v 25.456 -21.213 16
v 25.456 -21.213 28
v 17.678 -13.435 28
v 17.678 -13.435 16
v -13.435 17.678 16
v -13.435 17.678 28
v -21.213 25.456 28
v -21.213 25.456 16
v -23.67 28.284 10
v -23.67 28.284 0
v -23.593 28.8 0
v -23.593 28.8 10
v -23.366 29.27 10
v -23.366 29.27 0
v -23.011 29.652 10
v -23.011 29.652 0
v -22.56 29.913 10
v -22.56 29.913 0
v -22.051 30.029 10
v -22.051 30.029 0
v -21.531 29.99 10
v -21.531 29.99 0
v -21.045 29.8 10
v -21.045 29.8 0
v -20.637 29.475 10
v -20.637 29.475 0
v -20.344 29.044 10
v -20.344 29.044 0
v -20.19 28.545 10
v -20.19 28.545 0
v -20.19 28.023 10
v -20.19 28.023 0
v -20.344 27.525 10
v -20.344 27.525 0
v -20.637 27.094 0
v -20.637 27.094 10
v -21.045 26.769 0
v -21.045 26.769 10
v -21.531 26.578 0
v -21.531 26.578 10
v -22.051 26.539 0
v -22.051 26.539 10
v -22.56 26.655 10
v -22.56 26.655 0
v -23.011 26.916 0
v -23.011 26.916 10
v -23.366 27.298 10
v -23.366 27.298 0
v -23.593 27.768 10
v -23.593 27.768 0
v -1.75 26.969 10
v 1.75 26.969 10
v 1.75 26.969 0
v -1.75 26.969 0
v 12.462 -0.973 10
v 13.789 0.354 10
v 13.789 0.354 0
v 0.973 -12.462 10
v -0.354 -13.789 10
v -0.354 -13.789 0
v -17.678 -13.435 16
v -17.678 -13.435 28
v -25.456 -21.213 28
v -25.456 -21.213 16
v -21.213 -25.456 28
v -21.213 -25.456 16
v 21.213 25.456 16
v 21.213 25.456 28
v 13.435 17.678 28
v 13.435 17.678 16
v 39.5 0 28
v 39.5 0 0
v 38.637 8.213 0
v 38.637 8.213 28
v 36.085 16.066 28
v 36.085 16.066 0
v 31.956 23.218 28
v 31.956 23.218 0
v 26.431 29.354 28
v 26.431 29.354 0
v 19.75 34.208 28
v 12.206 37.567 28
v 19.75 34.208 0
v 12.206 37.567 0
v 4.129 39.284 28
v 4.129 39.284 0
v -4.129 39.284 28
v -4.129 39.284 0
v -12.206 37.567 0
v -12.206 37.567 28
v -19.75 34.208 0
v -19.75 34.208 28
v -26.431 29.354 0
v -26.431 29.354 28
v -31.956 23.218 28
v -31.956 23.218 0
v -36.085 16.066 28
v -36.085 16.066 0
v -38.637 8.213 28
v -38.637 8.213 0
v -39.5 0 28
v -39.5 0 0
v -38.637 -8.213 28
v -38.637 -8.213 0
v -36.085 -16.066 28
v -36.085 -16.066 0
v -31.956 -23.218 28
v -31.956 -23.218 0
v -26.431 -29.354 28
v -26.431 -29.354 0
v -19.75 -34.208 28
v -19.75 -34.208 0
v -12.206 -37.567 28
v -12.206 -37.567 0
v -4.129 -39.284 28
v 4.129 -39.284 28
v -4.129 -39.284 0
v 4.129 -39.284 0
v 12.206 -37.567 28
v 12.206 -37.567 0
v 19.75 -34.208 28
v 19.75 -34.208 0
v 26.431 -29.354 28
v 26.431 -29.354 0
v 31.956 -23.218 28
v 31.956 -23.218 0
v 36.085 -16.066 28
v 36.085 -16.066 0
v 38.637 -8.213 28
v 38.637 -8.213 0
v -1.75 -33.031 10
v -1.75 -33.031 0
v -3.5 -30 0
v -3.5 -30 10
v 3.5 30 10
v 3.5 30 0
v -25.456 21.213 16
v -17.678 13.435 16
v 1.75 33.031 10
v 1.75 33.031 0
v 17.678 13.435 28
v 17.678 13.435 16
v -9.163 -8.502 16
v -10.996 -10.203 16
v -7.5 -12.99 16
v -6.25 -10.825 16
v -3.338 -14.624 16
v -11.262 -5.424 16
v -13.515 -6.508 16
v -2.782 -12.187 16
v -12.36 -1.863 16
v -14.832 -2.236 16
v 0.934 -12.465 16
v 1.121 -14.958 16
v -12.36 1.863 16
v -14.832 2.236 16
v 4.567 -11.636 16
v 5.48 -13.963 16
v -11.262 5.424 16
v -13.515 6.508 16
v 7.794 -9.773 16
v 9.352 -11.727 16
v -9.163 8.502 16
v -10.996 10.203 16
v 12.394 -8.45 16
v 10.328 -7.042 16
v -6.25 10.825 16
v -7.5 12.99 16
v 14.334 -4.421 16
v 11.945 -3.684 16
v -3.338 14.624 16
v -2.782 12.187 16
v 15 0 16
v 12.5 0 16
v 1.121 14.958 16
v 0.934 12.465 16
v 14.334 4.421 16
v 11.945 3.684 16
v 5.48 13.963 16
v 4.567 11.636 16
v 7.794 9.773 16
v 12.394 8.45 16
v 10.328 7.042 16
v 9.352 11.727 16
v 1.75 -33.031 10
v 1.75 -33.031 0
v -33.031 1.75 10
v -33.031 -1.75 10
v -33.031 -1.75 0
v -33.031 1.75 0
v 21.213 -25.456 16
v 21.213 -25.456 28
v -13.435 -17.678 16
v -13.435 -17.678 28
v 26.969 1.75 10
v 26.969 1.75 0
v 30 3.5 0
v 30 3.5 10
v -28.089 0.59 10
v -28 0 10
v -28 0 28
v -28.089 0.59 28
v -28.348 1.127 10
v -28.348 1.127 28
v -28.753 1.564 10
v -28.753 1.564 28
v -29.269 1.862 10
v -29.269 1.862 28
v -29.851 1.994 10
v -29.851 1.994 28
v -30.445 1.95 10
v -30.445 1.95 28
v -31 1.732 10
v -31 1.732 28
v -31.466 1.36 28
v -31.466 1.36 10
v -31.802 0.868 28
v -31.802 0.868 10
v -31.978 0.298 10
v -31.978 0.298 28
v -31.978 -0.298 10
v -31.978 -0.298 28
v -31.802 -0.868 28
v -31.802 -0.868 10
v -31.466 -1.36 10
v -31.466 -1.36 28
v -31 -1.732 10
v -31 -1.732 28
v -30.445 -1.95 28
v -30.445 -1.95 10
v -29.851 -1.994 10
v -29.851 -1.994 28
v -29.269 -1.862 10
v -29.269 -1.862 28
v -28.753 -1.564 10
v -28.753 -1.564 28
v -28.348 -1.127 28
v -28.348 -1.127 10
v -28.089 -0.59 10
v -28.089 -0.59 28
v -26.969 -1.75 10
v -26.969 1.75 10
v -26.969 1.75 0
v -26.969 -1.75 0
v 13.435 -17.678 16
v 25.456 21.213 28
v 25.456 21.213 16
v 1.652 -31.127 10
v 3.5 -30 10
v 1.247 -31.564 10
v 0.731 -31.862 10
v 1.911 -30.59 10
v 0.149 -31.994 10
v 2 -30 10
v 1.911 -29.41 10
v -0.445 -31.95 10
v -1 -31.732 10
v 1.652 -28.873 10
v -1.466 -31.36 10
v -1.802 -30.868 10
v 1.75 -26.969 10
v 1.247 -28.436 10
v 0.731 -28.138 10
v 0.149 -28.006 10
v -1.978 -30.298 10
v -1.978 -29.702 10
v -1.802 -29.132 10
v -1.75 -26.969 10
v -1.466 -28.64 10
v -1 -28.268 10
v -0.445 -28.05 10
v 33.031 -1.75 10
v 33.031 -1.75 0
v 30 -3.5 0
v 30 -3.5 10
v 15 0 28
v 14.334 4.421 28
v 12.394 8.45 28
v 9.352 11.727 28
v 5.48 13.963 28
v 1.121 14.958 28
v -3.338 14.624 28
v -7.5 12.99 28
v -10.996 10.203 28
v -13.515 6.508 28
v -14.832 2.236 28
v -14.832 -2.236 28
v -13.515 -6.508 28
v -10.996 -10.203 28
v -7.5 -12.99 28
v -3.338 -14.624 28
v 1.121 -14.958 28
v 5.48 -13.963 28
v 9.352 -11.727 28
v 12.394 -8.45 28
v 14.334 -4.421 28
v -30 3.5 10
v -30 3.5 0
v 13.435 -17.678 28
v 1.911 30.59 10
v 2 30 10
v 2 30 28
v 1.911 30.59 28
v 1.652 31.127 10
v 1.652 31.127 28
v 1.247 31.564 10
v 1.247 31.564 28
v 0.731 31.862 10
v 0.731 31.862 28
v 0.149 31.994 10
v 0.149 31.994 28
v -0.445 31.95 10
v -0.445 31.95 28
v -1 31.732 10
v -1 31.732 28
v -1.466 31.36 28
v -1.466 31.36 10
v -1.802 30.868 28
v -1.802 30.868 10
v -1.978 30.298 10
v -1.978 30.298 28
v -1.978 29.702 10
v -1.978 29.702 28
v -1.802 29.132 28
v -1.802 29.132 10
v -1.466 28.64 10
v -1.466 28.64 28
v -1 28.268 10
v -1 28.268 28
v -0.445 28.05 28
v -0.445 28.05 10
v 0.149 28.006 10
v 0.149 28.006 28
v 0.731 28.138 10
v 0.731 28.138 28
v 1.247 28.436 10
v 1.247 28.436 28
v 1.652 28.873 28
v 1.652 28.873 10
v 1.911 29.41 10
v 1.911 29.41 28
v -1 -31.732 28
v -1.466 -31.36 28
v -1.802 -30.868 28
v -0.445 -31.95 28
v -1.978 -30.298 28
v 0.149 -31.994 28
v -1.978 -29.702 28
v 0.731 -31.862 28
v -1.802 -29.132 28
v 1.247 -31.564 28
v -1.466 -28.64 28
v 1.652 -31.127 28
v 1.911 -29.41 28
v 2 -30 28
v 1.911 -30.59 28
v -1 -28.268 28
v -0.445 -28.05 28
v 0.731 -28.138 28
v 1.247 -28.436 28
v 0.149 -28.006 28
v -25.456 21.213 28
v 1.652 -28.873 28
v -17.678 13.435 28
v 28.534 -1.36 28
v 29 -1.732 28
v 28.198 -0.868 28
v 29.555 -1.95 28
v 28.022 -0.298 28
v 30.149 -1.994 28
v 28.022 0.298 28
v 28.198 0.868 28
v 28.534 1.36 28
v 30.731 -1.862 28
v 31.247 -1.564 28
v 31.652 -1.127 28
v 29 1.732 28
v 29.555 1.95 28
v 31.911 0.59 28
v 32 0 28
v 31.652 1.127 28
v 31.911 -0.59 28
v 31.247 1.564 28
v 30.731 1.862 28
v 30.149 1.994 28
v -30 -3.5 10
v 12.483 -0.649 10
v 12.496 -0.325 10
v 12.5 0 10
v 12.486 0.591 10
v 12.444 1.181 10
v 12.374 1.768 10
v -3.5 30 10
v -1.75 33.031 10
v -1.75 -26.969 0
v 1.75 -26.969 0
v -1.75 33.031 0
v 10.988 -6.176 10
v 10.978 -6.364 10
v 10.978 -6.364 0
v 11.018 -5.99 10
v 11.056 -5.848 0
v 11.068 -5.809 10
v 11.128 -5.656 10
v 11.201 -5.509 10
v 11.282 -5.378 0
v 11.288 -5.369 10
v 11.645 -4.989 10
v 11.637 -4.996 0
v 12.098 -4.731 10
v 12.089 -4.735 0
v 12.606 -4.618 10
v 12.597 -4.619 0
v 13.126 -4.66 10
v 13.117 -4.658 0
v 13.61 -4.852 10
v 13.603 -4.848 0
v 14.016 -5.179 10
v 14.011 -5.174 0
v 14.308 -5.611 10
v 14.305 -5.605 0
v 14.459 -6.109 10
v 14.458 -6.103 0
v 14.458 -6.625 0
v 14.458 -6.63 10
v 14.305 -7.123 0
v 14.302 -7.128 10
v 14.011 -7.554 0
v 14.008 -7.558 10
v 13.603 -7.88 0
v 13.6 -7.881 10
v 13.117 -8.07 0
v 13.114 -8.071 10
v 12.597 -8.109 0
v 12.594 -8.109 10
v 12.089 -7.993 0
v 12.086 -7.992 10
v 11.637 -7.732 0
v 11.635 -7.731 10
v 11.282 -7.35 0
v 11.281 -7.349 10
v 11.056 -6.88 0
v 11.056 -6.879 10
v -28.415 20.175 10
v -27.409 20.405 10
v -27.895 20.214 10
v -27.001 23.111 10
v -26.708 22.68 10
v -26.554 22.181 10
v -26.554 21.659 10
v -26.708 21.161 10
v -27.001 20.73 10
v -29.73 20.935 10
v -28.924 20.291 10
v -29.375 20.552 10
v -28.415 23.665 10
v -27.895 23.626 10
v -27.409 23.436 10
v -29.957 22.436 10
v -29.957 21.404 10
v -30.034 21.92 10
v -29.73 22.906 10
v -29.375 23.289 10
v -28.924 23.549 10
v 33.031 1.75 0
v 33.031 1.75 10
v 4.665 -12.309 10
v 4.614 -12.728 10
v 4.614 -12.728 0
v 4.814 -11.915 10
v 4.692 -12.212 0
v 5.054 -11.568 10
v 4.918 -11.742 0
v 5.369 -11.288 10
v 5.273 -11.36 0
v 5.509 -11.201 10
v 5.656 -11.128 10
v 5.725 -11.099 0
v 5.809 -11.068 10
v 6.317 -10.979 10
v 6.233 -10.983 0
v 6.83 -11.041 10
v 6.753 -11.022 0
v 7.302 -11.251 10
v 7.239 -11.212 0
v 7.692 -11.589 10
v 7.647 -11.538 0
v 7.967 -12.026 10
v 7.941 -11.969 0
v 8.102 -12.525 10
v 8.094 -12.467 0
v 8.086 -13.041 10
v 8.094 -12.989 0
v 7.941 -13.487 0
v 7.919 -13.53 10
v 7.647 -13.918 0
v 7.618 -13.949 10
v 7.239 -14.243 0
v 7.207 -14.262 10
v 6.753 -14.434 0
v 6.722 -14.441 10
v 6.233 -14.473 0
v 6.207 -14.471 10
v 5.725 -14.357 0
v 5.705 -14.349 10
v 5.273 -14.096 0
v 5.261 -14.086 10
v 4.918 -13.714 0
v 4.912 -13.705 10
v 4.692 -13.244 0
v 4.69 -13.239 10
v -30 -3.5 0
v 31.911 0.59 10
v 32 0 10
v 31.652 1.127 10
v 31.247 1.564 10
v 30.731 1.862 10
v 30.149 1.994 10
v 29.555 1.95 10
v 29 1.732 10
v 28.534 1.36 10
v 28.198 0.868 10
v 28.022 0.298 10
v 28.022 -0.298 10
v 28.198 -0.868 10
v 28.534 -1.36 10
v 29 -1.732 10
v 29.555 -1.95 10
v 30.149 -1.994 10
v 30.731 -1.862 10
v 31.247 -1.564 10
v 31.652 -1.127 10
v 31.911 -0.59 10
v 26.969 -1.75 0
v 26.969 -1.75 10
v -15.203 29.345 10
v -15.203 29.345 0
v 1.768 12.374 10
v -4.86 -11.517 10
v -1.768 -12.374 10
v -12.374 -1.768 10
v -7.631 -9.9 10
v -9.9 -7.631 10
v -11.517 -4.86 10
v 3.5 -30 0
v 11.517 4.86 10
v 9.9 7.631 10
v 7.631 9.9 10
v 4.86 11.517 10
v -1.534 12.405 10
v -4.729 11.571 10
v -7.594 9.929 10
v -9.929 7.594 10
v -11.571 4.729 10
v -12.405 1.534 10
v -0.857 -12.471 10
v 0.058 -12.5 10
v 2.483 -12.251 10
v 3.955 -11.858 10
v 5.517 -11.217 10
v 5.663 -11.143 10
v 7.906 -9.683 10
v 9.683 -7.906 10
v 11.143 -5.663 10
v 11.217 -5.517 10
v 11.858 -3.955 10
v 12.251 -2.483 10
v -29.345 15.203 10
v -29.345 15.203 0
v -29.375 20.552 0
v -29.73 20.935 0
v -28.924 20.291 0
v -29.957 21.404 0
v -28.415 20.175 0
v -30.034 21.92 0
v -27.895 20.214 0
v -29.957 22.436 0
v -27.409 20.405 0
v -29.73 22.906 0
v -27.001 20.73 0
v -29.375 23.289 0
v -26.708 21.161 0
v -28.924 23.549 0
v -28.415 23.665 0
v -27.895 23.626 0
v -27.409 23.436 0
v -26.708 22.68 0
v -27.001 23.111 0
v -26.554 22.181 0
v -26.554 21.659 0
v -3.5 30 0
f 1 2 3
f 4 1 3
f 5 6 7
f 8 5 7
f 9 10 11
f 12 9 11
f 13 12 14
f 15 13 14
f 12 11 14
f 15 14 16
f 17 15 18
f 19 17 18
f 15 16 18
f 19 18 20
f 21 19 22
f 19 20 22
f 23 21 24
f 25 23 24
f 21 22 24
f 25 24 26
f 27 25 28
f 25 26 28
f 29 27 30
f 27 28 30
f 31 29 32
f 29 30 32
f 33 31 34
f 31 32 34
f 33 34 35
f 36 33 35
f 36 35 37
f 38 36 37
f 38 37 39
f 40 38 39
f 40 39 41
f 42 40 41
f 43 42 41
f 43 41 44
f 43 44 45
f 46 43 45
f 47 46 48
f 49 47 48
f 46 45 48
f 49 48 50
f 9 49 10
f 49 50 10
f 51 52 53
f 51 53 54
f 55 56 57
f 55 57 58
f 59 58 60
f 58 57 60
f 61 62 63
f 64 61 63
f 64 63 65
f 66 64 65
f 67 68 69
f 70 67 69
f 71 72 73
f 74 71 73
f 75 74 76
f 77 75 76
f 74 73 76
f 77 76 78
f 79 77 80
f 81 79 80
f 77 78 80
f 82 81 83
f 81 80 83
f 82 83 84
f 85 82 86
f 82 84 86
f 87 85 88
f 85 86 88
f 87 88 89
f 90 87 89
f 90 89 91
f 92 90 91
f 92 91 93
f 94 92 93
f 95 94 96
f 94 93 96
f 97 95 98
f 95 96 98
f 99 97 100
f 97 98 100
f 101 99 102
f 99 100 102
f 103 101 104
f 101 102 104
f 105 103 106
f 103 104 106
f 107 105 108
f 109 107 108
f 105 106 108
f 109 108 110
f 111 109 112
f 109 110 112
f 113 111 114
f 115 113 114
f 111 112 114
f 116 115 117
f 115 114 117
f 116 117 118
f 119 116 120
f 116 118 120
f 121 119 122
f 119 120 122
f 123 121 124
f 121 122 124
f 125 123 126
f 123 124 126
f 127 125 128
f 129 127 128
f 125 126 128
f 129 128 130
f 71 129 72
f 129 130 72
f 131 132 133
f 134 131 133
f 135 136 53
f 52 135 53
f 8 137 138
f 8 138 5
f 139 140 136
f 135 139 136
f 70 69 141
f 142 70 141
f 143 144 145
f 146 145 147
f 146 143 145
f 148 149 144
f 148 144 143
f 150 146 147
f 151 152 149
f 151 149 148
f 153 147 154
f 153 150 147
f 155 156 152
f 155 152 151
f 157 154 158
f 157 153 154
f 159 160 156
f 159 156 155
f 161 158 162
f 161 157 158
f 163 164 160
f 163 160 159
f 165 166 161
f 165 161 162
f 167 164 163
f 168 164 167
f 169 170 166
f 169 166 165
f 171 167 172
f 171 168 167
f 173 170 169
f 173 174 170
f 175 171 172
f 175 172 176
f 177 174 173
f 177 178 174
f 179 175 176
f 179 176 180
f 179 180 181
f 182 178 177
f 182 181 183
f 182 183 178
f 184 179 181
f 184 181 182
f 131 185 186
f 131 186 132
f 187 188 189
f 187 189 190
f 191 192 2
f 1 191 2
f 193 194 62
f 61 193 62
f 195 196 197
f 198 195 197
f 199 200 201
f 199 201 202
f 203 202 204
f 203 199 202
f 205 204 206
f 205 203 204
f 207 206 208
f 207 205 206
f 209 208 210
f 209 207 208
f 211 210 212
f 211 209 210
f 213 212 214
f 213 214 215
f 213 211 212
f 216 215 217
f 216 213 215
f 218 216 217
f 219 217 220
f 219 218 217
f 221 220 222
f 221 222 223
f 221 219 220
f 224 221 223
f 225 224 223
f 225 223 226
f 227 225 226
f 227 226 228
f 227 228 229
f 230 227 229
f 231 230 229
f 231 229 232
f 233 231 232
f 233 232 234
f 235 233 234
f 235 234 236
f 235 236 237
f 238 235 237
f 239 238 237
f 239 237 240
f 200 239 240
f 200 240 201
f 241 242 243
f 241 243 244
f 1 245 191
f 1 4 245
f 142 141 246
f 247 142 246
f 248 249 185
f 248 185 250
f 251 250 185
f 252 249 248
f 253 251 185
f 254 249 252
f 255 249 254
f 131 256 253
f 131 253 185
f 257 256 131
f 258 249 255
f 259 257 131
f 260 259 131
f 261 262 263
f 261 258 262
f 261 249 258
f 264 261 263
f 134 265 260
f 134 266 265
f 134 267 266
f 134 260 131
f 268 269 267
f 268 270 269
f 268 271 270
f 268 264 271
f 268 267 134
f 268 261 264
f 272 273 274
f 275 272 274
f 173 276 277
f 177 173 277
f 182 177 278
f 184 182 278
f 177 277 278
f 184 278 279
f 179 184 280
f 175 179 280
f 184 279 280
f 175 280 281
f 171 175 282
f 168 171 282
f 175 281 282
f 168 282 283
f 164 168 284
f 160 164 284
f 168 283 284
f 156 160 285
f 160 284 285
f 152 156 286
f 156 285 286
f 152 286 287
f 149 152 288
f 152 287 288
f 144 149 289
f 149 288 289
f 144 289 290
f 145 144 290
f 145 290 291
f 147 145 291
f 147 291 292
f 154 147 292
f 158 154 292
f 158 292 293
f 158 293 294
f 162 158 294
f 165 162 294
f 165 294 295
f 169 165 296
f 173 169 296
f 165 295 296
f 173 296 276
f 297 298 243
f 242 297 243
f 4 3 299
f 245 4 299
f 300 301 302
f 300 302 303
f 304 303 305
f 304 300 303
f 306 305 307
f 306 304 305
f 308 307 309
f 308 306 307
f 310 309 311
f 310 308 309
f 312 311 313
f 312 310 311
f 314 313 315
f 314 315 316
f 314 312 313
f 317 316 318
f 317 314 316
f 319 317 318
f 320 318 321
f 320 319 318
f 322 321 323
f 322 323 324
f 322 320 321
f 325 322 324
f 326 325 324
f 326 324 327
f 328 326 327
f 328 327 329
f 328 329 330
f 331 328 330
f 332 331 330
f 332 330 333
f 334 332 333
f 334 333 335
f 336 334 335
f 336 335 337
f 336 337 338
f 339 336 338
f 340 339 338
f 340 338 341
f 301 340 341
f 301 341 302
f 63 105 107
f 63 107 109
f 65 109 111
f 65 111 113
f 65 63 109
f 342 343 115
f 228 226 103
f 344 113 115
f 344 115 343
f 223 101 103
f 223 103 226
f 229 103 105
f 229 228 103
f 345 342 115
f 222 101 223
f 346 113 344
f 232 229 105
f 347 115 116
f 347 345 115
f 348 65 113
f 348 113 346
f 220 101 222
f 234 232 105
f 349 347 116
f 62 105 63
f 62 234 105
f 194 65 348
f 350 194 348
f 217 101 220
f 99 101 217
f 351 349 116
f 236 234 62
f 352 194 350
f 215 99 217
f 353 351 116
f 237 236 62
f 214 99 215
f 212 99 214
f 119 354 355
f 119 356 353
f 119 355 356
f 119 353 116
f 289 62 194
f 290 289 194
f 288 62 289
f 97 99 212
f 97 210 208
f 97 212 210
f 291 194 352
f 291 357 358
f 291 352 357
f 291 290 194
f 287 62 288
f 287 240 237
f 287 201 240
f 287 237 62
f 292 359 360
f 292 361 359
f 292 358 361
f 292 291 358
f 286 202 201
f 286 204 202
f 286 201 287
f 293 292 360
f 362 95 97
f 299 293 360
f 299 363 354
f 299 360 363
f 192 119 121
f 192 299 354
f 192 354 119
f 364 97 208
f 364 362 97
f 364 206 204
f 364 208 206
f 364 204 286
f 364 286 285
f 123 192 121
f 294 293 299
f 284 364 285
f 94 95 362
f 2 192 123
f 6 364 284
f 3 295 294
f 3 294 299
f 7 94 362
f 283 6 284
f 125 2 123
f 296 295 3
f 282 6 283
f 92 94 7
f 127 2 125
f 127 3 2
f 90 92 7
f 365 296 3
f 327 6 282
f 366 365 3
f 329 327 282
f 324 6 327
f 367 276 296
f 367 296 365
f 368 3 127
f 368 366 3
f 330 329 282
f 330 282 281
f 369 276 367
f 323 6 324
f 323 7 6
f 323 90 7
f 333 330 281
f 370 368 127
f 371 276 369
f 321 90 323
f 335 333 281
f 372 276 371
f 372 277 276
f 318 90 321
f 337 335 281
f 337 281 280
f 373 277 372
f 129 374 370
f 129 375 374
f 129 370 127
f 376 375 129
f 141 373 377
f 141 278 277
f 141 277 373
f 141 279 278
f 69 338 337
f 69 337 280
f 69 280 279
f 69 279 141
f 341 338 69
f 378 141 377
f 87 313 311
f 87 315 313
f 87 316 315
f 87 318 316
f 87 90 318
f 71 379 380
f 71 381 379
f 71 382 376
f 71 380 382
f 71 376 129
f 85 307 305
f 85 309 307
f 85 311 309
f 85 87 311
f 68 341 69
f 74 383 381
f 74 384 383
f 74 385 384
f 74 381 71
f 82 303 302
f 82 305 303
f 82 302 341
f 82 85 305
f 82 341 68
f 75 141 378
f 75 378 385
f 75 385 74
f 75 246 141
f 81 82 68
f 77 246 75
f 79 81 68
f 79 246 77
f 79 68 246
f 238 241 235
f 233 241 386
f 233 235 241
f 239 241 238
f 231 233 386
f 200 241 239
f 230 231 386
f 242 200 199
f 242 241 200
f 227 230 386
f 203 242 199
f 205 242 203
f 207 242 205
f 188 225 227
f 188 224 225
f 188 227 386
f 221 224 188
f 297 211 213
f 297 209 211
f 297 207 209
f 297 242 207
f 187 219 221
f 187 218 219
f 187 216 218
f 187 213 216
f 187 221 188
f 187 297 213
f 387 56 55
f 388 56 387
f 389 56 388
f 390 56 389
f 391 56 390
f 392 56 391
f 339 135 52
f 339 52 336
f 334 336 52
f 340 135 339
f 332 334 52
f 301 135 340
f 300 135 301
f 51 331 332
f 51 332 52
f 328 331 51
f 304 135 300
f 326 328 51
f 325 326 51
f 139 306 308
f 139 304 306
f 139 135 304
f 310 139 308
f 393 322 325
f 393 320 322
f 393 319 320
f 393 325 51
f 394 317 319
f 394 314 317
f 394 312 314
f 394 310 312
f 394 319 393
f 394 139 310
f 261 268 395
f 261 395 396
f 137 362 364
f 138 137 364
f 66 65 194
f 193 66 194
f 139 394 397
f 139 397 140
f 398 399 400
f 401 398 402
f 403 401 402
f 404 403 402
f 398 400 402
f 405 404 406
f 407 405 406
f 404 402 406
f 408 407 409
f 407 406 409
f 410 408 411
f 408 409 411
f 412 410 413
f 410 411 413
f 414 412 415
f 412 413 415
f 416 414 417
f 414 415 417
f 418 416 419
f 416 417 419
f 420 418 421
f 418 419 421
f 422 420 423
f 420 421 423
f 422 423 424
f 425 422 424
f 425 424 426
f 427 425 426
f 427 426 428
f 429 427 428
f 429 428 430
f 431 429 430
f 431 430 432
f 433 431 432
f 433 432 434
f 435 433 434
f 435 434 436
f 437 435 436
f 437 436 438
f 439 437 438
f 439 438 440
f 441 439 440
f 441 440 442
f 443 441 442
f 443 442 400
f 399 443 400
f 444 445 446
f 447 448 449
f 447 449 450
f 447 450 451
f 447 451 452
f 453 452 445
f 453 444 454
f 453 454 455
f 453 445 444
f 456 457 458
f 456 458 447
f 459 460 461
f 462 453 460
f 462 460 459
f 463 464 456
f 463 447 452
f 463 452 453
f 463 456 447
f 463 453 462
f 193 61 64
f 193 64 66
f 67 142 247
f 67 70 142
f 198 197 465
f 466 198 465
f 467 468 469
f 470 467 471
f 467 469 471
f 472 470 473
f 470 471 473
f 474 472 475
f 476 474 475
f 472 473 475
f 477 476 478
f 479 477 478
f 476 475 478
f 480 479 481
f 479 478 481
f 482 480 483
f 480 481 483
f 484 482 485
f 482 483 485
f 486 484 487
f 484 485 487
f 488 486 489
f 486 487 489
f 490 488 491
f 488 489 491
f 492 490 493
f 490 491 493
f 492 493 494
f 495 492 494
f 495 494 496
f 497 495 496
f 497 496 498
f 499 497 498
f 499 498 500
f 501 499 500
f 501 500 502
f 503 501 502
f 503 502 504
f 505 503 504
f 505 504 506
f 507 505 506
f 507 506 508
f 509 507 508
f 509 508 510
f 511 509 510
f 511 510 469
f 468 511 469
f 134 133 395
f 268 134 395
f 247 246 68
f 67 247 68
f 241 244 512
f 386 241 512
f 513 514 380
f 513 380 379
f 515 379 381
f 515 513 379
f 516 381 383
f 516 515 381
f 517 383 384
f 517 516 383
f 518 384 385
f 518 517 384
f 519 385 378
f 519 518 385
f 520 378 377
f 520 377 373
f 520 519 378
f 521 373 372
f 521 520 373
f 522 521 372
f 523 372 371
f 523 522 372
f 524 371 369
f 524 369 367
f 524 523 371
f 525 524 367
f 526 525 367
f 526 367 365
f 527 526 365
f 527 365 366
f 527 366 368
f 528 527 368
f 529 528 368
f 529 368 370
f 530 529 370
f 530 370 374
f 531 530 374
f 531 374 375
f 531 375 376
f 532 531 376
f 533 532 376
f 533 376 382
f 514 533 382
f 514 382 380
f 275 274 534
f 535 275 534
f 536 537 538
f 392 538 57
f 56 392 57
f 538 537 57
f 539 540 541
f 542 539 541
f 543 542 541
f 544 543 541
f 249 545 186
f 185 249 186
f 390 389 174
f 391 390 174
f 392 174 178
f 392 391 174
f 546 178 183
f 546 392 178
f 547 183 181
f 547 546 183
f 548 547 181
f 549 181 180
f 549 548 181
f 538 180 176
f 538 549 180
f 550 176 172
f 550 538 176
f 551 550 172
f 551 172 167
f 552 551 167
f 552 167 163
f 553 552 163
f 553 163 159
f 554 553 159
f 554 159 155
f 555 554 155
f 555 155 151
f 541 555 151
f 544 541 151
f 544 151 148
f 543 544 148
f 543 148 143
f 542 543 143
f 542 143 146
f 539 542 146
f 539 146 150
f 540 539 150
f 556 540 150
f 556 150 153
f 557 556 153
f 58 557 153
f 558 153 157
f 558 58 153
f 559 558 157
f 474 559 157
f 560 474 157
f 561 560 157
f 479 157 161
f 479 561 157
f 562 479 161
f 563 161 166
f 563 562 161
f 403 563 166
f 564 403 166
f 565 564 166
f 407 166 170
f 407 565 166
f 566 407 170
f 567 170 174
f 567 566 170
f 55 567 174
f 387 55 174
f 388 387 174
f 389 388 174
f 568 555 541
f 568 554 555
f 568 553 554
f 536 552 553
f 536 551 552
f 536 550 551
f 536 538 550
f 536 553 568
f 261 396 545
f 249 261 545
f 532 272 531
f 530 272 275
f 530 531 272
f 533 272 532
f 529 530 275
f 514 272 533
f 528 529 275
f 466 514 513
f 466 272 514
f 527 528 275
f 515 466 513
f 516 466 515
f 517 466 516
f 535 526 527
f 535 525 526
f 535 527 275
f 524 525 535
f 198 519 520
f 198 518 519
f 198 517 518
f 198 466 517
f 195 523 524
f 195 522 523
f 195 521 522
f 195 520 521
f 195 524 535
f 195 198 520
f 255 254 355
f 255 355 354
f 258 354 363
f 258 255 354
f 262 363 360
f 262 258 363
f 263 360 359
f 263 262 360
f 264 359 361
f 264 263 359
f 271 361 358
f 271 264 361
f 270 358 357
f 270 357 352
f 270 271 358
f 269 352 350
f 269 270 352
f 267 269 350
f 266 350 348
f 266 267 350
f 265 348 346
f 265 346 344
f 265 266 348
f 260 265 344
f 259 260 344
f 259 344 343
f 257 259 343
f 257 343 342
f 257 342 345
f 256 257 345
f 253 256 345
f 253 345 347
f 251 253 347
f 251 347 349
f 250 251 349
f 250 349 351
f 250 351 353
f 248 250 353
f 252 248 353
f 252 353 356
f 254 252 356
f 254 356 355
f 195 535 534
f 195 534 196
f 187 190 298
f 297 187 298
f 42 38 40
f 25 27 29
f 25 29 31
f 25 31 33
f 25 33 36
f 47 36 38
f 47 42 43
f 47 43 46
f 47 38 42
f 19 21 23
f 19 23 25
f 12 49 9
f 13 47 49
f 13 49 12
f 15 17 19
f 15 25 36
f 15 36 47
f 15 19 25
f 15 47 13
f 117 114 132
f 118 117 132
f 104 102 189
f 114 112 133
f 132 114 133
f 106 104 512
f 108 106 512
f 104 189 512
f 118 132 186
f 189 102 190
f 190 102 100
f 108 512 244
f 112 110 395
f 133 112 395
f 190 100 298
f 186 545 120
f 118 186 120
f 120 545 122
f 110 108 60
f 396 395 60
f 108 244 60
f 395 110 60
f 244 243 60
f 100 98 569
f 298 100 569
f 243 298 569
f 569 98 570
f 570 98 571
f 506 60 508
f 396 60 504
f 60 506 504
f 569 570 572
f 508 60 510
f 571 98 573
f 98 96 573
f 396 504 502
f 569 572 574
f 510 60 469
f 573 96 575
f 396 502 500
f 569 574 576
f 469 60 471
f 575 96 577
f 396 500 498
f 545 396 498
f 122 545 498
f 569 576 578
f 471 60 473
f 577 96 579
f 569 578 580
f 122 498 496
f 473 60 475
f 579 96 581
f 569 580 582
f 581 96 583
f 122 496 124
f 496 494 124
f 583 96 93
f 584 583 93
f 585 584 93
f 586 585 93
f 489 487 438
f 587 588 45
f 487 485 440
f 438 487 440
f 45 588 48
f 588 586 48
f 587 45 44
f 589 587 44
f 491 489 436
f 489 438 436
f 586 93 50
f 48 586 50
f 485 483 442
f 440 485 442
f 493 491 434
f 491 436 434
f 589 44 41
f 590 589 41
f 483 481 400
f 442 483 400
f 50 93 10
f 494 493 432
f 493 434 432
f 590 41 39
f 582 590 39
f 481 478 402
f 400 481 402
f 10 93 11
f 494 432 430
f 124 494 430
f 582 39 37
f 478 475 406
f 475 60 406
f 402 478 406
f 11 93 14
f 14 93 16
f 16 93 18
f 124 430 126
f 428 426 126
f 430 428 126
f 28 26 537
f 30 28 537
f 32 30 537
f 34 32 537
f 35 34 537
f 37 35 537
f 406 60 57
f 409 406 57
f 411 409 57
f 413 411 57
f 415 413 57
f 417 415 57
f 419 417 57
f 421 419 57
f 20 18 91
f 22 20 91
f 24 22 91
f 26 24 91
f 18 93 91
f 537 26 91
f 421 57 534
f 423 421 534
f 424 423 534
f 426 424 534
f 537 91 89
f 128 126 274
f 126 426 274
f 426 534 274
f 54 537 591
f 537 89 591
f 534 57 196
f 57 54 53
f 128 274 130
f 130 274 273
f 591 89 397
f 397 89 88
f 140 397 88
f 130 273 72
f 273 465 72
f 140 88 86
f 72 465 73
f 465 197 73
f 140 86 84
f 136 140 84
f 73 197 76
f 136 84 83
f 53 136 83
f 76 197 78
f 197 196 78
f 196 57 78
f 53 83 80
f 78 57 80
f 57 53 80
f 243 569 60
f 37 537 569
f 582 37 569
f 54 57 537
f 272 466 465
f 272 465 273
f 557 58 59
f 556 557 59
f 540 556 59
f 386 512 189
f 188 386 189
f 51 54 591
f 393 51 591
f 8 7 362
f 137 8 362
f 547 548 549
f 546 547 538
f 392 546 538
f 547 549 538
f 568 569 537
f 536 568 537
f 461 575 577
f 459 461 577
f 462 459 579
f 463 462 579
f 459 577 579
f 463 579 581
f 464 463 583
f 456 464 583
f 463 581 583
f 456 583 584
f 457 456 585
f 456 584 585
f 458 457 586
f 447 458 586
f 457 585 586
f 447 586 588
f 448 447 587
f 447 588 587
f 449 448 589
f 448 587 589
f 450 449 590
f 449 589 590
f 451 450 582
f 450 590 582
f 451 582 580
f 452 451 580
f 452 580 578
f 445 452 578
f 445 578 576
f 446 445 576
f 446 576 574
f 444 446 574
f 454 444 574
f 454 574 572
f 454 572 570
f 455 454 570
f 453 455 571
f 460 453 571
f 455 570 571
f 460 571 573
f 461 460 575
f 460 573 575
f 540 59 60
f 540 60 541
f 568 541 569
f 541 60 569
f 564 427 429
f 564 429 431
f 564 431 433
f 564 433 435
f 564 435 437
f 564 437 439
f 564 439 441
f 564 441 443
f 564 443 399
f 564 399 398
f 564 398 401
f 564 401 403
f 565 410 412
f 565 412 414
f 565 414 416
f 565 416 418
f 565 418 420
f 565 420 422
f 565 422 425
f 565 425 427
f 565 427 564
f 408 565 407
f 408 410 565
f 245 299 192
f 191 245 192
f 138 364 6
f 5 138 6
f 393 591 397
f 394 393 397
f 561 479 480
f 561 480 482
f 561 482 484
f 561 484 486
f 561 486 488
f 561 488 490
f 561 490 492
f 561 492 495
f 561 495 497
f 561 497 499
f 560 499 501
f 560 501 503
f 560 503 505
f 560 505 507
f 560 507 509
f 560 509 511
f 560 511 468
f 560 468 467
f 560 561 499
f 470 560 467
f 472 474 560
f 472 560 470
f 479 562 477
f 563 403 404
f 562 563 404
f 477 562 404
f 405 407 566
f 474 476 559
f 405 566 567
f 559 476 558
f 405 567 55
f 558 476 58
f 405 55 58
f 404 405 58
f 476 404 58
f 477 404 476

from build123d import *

# Parameters (mm, degrees)
CROQUIS1_R              = 39.5
CROQUIS1_R_2            = 12.5
CROQUIS1_R_3            = 2
SALIENTE_EXTRUIR1_DEPTH = 28
CROQUIS3_R              = 15
CORTAR_EXTRUIR1_DEPTH   = 12
CROQUIS5_R              = 16.857920318
SALIENTE_EXTRUIR2_DEPTH = 10
CROQUIS4_R              = 1.75
CORTAR_EXTRUIR2_DEPTH   = 10


with BuildPart() as part:
    # Croquis1 → Saliente-Extruir1 (new body)
    with BuildSketch(Plane.XY):
        Circle(CROQUIS1_R)
        Circle(CROQUIS1_R_2, mode=Mode.SUBTRACT)
        with Locations((0, 30)):
            Circle(CROQUIS1_R_3, mode=Mode.SUBTRACT)
        with Locations((30, 0)):
            Circle(CROQUIS1_R_3, mode=Mode.SUBTRACT)
        with Locations((0, -30)):
            Circle(CROQUIS1_R_3, mode=Mode.SUBTRACT)
        with Locations((-30, 0)):
            Circle(CROQUIS1_R_3, mode=Mode.SUBTRACT)
    extrude(amount=SALIENTE_EXTRUIR1_DEPTH)

    # Croquis3 → Cortar-Extruir1 (cut)
    with BuildSketch(Plane.XY.offset(28)):
        Circle(CROQUIS3_R)
        Polygon((17.67766953, 13.435028843), (25.455844123, 21.213203436), (21.213203436, 25.455844123), (13.435028843, 17.67766953), align=None)
        Polygon((13.435028843, -17.67766953), (21.213203436, -25.455844123), (25.455844123, -21.213203436), (17.67766953, -13.435028843), align=None)
        Polygon((-17.67766953, -13.435028843), (-25.455844123, -21.213203436), (-21.213203436, -25.455844123), (-13.435028843, -17.67766953), align=None)
        Polygon((-13.435028843, 17.67766953), (-21.213203436, 25.455844123), (-25.455844123, 21.213203436), (-17.67766953, 13.435028843), align=None)
    extrude(amount=-CORTAR_EXTRUIR1_DEPTH, mode=Mode.SUBTRACT)

    # Croquis5 → Saliente-Extruir2 (add)
    with BuildSketch(Plane(origin=(0, 0, 0), x_dir=(-1, 0, 0), z_dir=(0, 0, -1))):
        Circle(CROQUIS5_R)
    extrude(amount=-SALIENTE_EXTRUIR2_DEPTH)

    # Croquis4 → Cortar-Extruir2 (cut)
    with BuildSketch(Plane(origin=(0, 0, 0), x_dir=(-1, 0, 0), z_dir=(0, 0, -1))):
        with Locations((-12.727922061, -6.363961031)):
            Circle(CROQUIS4_R)
        with Locations((-6.363961031, -12.727922061)):
            Circle(CROQUIS4_R)
        with Locations((21.920310217, 28.284271247)):
            Circle(CROQUIS4_R)
        with Locations((28.284271247, 21.920310217)):
            Circle(CROQUIS4_R)
        Polygon((30, -3.5), (33.031088913, -1.75), (33.031088913, 1.75), (30, 3.5), (26.968911087, 1.75), (26.968911087, -1.75), align=None)
        Polygon((3.5, 30), (1.75, 33.031088913), (-1.75, 33.031088913), (-3.5, 30), (-1.75, 26.968911087), (1.75, 26.968911087), align=None)
        Polygon((-3.5, -30), (-1.75, -33.031088913), (1.75, -33.031088913), (3.5, -30), (1.75, -26.968911087), (-1.75, -26.968911087), align=None)
        Polygon((-30, 3.5), (-33.031088913, 1.75), (-33.031088913, -1.75), (-30, -3.5), (-26.968911087, -1.75), (-26.968911087, 1.75), align=None)
        Polygon((0.353553391, -13.788582233), (29.344931419, 15.202795796), (15.202795796, 29.344931419), (-13.788582233, 0.353553391), align=None)
    extrude(amount=-CORTAR_EXTRUIR2_DEPTH, mode=Mode.SUBTRACT)


solid = part.part
